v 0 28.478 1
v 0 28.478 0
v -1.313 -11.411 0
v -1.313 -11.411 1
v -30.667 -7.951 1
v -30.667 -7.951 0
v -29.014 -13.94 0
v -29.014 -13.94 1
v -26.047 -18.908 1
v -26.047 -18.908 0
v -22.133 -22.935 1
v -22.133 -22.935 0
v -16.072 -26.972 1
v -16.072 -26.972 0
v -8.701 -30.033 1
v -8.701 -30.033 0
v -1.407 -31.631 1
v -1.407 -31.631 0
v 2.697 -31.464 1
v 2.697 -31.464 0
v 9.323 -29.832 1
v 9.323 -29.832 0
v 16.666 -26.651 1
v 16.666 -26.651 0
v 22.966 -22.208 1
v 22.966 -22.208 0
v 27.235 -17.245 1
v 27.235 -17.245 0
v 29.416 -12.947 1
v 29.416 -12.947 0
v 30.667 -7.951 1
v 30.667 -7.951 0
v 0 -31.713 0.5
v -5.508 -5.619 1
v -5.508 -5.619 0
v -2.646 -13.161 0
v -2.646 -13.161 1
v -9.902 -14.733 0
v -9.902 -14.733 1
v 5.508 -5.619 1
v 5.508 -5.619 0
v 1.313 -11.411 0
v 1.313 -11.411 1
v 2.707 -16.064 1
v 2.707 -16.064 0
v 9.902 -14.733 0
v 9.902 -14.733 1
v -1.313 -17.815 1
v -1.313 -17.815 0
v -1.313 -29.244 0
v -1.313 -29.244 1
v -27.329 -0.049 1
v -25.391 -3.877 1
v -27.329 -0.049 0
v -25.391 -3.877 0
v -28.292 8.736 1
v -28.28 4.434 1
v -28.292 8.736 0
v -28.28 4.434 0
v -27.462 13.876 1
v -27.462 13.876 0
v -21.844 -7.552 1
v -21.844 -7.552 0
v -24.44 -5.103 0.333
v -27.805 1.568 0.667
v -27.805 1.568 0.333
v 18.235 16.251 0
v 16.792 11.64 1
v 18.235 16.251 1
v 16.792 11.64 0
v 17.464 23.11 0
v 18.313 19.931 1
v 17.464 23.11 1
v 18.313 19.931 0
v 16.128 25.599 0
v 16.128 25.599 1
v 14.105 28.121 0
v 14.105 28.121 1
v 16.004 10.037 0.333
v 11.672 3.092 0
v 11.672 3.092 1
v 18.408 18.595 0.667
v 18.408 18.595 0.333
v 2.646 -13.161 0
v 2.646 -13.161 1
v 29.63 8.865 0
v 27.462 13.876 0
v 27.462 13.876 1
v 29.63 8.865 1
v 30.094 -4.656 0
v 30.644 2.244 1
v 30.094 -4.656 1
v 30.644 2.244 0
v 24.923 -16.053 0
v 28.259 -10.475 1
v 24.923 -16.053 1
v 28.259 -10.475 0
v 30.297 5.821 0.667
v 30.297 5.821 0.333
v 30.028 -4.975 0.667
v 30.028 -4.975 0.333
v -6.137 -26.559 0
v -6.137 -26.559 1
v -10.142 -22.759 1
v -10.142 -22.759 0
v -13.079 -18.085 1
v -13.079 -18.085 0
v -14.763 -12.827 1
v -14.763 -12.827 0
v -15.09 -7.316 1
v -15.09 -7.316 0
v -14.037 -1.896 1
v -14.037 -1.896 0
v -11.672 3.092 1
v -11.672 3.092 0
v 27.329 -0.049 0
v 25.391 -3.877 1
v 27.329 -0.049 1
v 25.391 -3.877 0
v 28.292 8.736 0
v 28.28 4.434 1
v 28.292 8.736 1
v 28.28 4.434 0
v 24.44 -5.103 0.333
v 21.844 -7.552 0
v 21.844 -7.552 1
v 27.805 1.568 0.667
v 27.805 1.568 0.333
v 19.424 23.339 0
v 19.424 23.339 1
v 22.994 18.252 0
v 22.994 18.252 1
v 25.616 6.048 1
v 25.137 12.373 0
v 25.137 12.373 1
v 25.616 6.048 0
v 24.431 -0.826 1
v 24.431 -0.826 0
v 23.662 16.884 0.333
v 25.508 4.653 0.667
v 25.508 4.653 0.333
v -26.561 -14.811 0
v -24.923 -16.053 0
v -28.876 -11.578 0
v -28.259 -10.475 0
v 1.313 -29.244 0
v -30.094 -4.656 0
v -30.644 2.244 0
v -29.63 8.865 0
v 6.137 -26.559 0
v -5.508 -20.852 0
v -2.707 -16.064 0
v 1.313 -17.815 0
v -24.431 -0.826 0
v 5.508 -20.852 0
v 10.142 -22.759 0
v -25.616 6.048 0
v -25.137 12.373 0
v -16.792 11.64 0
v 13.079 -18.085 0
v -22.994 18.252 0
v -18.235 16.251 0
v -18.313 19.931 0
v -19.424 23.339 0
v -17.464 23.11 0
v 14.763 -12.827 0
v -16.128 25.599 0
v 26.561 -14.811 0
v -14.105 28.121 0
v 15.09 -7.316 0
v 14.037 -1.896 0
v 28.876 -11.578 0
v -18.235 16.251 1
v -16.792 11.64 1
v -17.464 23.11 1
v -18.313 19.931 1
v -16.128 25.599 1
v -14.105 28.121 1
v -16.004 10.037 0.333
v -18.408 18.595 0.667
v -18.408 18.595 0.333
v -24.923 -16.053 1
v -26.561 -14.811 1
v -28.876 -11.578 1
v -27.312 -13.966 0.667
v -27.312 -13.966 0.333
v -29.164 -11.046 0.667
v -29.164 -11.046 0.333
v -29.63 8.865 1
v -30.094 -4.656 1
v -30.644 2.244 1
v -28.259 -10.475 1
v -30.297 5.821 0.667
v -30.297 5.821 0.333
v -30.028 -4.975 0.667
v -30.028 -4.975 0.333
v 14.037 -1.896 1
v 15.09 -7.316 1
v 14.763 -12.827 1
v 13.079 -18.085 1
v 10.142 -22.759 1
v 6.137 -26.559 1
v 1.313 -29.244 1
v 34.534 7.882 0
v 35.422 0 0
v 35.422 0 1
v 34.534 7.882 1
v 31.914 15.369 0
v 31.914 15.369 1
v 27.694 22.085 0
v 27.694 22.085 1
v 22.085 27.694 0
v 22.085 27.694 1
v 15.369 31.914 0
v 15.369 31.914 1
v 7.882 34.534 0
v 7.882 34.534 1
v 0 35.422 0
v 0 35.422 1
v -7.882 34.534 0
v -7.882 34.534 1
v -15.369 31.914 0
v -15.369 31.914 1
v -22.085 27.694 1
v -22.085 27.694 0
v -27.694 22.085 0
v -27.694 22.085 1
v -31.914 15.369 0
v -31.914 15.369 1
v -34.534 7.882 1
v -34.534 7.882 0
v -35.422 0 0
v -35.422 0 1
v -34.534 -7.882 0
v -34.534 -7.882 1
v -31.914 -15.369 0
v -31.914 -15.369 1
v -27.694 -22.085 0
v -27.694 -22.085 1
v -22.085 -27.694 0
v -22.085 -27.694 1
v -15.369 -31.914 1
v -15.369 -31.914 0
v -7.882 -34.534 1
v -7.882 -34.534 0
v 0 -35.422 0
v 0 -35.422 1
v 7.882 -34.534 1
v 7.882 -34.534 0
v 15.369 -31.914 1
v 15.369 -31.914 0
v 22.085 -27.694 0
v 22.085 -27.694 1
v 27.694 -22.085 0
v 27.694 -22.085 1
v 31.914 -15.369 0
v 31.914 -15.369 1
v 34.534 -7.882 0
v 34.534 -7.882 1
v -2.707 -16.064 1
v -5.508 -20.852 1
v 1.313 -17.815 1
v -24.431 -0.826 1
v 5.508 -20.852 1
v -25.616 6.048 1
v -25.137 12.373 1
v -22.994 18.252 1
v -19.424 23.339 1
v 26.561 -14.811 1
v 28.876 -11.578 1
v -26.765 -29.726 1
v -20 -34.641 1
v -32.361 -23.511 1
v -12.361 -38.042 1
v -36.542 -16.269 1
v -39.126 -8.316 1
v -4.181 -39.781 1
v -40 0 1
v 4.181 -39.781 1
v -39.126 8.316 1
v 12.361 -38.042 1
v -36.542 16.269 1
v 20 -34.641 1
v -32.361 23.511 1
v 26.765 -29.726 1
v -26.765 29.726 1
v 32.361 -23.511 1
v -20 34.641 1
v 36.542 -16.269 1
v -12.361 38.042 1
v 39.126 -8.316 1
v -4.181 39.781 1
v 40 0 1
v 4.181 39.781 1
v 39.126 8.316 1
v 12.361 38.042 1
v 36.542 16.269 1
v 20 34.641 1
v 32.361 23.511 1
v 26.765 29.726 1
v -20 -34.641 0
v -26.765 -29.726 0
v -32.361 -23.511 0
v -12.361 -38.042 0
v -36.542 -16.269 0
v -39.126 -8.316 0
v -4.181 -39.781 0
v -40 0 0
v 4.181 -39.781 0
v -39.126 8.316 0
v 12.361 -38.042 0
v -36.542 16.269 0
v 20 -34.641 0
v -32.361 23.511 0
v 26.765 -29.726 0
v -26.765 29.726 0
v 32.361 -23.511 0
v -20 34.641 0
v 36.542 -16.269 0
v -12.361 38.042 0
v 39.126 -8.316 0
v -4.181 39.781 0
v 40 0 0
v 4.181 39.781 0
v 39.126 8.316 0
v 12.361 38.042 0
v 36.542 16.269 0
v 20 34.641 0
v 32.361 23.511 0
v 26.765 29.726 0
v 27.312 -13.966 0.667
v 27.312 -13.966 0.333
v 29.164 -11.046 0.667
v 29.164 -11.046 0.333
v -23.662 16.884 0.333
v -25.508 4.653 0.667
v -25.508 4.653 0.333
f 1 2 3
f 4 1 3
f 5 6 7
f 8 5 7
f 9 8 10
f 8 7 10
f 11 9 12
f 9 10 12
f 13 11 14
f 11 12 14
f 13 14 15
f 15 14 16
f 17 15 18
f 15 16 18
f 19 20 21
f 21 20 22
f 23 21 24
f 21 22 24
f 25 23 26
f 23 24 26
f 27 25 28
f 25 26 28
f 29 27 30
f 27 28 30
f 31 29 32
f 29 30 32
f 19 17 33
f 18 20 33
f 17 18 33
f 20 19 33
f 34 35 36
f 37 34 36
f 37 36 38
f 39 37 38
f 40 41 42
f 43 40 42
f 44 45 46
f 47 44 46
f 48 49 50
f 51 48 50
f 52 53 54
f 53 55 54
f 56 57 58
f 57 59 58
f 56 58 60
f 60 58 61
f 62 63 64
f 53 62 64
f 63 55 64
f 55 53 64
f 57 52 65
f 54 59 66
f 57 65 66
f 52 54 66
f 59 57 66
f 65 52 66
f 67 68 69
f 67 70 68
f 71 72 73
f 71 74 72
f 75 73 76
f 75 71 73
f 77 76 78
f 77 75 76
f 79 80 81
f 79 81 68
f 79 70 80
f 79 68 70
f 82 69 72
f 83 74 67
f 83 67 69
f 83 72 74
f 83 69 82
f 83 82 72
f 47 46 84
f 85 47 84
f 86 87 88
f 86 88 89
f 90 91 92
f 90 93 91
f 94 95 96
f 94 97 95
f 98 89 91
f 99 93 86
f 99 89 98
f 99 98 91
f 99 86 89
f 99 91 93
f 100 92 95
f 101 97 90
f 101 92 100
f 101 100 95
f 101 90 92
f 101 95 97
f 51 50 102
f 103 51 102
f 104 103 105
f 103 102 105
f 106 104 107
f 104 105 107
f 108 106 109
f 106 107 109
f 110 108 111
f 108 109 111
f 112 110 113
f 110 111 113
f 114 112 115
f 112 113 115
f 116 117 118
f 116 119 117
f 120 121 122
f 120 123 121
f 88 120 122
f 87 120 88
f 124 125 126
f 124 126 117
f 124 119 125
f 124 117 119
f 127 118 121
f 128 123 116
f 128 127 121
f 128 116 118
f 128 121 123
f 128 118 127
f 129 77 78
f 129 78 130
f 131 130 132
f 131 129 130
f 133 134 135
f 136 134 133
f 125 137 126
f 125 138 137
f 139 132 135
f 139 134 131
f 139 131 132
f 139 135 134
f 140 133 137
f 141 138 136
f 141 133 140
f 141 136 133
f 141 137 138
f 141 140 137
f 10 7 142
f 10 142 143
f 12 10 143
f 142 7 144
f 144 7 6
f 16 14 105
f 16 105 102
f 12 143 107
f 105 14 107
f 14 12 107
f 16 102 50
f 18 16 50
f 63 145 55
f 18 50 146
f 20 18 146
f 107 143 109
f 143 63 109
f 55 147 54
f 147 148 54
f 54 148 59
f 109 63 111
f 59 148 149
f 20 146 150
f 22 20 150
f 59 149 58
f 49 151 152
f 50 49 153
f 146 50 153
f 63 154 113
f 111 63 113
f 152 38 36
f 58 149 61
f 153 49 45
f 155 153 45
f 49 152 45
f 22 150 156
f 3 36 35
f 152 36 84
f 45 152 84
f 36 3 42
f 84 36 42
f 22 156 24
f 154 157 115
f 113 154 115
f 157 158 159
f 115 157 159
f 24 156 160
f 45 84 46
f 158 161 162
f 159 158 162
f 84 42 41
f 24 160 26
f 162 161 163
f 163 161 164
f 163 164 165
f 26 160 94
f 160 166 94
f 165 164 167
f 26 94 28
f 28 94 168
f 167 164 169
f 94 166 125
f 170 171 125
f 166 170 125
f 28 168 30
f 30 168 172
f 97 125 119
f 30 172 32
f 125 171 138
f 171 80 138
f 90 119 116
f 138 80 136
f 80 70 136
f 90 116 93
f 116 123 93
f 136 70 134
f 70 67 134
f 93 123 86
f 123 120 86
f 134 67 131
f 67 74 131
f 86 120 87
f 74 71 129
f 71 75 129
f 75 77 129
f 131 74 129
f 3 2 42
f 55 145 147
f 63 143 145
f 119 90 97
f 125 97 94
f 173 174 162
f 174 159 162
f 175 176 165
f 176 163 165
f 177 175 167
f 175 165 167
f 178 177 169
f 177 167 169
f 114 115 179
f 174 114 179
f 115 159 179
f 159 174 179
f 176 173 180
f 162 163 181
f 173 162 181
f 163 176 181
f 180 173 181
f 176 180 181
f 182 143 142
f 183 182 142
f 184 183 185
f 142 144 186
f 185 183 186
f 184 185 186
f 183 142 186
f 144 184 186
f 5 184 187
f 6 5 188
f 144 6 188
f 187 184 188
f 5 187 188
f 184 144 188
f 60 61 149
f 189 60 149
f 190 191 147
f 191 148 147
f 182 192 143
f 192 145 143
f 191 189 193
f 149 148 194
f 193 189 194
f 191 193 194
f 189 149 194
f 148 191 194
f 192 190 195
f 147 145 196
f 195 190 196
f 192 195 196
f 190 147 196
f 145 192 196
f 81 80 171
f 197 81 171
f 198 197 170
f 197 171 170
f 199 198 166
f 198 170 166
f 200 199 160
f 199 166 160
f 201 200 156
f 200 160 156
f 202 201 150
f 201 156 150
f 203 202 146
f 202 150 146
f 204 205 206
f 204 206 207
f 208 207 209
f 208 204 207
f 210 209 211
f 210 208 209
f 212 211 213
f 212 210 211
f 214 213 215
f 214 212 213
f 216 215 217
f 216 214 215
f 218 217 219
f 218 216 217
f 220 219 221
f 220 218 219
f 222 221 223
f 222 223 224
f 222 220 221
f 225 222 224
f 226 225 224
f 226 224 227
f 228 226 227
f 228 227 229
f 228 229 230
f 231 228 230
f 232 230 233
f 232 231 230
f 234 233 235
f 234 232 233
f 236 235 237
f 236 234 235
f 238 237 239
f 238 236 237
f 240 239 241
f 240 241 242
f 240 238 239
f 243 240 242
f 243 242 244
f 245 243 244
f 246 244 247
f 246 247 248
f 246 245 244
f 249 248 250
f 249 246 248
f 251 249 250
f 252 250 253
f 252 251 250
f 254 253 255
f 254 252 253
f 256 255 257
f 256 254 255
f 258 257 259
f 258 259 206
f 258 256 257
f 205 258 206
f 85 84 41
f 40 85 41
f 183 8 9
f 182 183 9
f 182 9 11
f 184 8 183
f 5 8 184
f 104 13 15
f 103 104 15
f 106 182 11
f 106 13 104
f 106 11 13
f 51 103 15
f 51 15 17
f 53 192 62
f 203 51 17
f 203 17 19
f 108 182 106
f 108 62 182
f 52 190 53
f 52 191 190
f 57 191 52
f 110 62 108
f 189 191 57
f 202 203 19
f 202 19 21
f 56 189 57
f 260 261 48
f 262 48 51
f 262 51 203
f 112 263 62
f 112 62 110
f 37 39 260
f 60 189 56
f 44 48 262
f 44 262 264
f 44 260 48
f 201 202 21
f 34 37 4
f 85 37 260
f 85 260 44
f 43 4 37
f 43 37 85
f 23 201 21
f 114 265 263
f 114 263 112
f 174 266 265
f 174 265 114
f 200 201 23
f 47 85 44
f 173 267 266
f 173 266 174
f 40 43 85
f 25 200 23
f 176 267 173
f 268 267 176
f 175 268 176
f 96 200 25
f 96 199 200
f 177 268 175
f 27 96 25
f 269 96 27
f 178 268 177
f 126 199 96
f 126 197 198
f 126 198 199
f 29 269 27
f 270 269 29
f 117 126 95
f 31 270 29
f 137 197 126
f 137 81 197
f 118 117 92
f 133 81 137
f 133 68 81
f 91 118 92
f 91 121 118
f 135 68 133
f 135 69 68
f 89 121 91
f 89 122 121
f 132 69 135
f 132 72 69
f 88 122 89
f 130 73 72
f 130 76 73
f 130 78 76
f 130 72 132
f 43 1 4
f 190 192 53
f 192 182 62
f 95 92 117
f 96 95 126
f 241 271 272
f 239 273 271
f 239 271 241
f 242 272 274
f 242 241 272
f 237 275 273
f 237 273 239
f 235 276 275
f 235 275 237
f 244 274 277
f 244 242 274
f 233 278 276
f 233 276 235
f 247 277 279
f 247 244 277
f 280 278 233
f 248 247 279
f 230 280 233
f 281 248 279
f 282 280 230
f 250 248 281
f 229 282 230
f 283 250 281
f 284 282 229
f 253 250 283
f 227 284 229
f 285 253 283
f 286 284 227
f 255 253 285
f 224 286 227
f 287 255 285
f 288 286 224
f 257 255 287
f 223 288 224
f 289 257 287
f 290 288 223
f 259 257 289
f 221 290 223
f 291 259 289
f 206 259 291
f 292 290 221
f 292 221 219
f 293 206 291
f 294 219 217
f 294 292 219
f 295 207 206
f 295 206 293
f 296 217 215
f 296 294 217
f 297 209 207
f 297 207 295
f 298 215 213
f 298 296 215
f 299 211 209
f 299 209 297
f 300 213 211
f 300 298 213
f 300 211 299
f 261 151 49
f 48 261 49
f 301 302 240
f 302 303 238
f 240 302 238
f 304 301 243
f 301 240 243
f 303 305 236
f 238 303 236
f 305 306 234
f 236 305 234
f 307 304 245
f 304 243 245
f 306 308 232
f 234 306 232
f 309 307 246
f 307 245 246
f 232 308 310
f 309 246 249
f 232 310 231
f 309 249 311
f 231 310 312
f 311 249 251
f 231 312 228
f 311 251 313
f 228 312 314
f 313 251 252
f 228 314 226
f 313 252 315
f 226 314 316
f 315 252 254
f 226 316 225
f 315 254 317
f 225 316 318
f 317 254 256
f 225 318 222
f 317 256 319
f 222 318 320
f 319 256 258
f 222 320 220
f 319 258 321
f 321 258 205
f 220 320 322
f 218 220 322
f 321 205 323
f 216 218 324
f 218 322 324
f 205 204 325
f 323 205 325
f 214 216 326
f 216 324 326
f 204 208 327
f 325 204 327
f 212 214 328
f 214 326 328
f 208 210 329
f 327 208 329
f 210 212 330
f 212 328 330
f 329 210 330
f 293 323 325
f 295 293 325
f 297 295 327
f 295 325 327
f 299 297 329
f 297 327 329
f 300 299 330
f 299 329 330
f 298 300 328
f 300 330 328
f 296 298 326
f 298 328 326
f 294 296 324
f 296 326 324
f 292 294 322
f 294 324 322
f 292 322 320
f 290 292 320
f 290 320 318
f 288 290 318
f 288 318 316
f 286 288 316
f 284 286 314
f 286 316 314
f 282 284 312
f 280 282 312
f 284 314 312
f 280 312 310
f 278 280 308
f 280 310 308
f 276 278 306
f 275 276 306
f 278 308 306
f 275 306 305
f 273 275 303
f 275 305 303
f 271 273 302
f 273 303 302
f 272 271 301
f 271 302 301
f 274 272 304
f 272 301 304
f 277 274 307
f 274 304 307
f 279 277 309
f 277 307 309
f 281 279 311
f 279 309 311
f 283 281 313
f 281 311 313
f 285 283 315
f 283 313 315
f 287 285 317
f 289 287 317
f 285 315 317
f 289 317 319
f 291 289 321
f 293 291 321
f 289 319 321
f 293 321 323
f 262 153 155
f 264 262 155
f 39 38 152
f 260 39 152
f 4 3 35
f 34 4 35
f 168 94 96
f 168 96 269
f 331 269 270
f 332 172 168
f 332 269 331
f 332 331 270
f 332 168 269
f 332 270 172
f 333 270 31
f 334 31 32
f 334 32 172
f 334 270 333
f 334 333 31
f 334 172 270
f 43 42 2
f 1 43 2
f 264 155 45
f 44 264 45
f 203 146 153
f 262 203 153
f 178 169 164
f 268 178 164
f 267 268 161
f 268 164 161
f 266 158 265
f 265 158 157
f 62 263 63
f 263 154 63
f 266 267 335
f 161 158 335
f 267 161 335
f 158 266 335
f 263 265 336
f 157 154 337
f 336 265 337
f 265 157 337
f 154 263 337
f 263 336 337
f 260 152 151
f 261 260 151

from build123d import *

# Parameters (mm, degrees)
F0_R     = 40
F0_R_2   = 35.422102
F1_DEPTH = 1


with BuildPart() as f1:
    # F0 (on Top) → F1 (new body)
    with BuildSketch(Plane.XY):
        Circle(F0_R)
        Circle(F0_R_2, mode=Mode.SUBTRACT)
        with BuildLine():
            Line((1.313285, -11.41147), (0, 28.478035))
            Line((0, 28.478035), (-1.313285, -11.41147))
            Line((-1.313285, -11.41147), (-5.507818, -5.619304))
            Line((-5.507818, -5.619304), (-2.64649, -13.161371))
            Line((-2.64649, -13.161371), (-9.902007, -14.7334))
            Line((-9.902007, -14.7334), (-2.706952, -16.063579))
            Line((-2.706952, -16.063579), (-5.507818, -20.852241))
            Line((-5.507818, -20.852241), (-1.313285, -17.814672))
            Line((-1.313285, -17.814672), (-1.313285, -29.244435))
            ThreePointArc((-1.313285, -29.244435), (-14.086236, -15.508678), (-11.672494, 3.092213))
            add(Edge.make_bspline(
                [(-11.672494, 3.092213), (-15.374468, 9.014808), (-23.355535, 18.326055), (-14.104752, 28.121004)],
                knots=[0, 0, 0, 0, 25.146695, 25.146695, 25.146695, 25.146695], degree=3))
            add(Edge.make_bspline(
                [(-14.104752, 28.121004), (-28.253009, 17.721428), (-27.527459, 4.298722), (-21.84397, -7.551955)],
                knots=[0, 0, 0, 0, 36.502815, 36.502815, 36.502815, 36.502815], degree=3))
            add(Edge.make_bspline(
                [(-21.84397, -7.551955), (-22.564647, -6.74157), (-31.150342, -1.723171), (-27.462122, 13.876191)],
                knots=[0, 0, 0, 0, 22.152406, 22.152406, 22.152406, 22.152406], degree=3))
            add(Edge.make_bspline(
                [(-27.462122, 13.876191), (-31.271267, 8.011315), (-33.024686, -5.653242), (-24.92269, -16.052816)],
                knots=[0, 0, 0, 0, 30.036548, 30.036548, 30.036548, 30.036548], degree=3))
            add(Edge.make_bspline(
                [(-24.92269, -16.052816), (-27.64351, -14.601713), (-29.276, -10.913491), (-30.66664, -7.950822)],
                knots=[0, 0, 0, 0, 9.931529, 9.931529, 9.931529, 9.931529], degree=3))
            add(Edge.make_bspline(
                [(-30.66664, -7.950822), (-28.187674, -26.452388), (-5.45372, -31.712639), (0, -31.712639)],
                knots=[0, 0, 0, 0, 38.79519, 38.79519, 38.79519, 38.79519], degree=3))
            add(Edge.make_bspline(
                [(30.66664, -7.950822), (28.187674, -26.452388), (5.45372, -31.712639), (0, -31.712639)],
                knots=[0, 0, 0, 0, 38.79519, 38.79519, 38.79519, 38.79519], degree=3))
            add(Edge.make_bspline(
                [(24.92269, -16.052816), (27.64351, -14.601713), (29.276, -10.913491), (30.66664, -7.950822)],
                knots=[0, 0, 0, 0, 9.931529, 9.931529, 9.931529, 9.931529], degree=3))
            add(Edge.make_bspline(
                [(27.462122, 13.876191), (31.271267, 8.011315), (33.024686, -5.653242), (24.92269, -16.052816)],
                knots=[0, 0, 0, 0, 30.036548, 30.036548, 30.036548, 30.036548], degree=3))
            add(Edge.make_bspline(
                [(21.84397, -7.551955), (22.564647, -6.74157), (31.150342, -1.723171), (27.462122, 13.876191)],
                knots=[0, 0, 0, 0, 22.152406, 22.152406, 22.152406, 22.152406], degree=3))
            add(Edge.make_bspline(
                [(14.104752, 28.121004), (28.253009, 17.721428), (27.527459, 4.298722), (21.84397, -7.551955)],
                knots=[0, 0, 0, 0, 36.502815, 36.502815, 36.502815, 36.502815], degree=3))
            add(Edge.make_bspline(
                [(11.672494, 3.092213), (15.374468, 9.014808), (23.355535, 18.326055), (14.104752, 28.121004)],
                knots=[0, 0, 0, 0, 25.146695, 25.146695, 25.146695, 25.146695], degree=3))
            ThreePointArc((11.672494, 3.092213), (14.086236, -15.508678), (1.313285, -29.244435))
            Line((1.313285, -29.244435), (1.313285, -17.814672))
            Line((1.313285, -17.814672), (5.507818, -20.852241))
            Line((5.507818, -20.852241), (2.706952, -16.063579))
            Line((2.706952, -16.063579), (9.902007, -14.7334))
            Line((9.902007, -14.7334), (2.64649, -13.161371))
            Line((2.64649, -13.161371), (5.507818, -5.619304))
            Line((5.507818, -5.619304), (1.313285, -11.41147))
        make_face()
    extrude(amount=F1_DEPTH)


solid = f1.part
